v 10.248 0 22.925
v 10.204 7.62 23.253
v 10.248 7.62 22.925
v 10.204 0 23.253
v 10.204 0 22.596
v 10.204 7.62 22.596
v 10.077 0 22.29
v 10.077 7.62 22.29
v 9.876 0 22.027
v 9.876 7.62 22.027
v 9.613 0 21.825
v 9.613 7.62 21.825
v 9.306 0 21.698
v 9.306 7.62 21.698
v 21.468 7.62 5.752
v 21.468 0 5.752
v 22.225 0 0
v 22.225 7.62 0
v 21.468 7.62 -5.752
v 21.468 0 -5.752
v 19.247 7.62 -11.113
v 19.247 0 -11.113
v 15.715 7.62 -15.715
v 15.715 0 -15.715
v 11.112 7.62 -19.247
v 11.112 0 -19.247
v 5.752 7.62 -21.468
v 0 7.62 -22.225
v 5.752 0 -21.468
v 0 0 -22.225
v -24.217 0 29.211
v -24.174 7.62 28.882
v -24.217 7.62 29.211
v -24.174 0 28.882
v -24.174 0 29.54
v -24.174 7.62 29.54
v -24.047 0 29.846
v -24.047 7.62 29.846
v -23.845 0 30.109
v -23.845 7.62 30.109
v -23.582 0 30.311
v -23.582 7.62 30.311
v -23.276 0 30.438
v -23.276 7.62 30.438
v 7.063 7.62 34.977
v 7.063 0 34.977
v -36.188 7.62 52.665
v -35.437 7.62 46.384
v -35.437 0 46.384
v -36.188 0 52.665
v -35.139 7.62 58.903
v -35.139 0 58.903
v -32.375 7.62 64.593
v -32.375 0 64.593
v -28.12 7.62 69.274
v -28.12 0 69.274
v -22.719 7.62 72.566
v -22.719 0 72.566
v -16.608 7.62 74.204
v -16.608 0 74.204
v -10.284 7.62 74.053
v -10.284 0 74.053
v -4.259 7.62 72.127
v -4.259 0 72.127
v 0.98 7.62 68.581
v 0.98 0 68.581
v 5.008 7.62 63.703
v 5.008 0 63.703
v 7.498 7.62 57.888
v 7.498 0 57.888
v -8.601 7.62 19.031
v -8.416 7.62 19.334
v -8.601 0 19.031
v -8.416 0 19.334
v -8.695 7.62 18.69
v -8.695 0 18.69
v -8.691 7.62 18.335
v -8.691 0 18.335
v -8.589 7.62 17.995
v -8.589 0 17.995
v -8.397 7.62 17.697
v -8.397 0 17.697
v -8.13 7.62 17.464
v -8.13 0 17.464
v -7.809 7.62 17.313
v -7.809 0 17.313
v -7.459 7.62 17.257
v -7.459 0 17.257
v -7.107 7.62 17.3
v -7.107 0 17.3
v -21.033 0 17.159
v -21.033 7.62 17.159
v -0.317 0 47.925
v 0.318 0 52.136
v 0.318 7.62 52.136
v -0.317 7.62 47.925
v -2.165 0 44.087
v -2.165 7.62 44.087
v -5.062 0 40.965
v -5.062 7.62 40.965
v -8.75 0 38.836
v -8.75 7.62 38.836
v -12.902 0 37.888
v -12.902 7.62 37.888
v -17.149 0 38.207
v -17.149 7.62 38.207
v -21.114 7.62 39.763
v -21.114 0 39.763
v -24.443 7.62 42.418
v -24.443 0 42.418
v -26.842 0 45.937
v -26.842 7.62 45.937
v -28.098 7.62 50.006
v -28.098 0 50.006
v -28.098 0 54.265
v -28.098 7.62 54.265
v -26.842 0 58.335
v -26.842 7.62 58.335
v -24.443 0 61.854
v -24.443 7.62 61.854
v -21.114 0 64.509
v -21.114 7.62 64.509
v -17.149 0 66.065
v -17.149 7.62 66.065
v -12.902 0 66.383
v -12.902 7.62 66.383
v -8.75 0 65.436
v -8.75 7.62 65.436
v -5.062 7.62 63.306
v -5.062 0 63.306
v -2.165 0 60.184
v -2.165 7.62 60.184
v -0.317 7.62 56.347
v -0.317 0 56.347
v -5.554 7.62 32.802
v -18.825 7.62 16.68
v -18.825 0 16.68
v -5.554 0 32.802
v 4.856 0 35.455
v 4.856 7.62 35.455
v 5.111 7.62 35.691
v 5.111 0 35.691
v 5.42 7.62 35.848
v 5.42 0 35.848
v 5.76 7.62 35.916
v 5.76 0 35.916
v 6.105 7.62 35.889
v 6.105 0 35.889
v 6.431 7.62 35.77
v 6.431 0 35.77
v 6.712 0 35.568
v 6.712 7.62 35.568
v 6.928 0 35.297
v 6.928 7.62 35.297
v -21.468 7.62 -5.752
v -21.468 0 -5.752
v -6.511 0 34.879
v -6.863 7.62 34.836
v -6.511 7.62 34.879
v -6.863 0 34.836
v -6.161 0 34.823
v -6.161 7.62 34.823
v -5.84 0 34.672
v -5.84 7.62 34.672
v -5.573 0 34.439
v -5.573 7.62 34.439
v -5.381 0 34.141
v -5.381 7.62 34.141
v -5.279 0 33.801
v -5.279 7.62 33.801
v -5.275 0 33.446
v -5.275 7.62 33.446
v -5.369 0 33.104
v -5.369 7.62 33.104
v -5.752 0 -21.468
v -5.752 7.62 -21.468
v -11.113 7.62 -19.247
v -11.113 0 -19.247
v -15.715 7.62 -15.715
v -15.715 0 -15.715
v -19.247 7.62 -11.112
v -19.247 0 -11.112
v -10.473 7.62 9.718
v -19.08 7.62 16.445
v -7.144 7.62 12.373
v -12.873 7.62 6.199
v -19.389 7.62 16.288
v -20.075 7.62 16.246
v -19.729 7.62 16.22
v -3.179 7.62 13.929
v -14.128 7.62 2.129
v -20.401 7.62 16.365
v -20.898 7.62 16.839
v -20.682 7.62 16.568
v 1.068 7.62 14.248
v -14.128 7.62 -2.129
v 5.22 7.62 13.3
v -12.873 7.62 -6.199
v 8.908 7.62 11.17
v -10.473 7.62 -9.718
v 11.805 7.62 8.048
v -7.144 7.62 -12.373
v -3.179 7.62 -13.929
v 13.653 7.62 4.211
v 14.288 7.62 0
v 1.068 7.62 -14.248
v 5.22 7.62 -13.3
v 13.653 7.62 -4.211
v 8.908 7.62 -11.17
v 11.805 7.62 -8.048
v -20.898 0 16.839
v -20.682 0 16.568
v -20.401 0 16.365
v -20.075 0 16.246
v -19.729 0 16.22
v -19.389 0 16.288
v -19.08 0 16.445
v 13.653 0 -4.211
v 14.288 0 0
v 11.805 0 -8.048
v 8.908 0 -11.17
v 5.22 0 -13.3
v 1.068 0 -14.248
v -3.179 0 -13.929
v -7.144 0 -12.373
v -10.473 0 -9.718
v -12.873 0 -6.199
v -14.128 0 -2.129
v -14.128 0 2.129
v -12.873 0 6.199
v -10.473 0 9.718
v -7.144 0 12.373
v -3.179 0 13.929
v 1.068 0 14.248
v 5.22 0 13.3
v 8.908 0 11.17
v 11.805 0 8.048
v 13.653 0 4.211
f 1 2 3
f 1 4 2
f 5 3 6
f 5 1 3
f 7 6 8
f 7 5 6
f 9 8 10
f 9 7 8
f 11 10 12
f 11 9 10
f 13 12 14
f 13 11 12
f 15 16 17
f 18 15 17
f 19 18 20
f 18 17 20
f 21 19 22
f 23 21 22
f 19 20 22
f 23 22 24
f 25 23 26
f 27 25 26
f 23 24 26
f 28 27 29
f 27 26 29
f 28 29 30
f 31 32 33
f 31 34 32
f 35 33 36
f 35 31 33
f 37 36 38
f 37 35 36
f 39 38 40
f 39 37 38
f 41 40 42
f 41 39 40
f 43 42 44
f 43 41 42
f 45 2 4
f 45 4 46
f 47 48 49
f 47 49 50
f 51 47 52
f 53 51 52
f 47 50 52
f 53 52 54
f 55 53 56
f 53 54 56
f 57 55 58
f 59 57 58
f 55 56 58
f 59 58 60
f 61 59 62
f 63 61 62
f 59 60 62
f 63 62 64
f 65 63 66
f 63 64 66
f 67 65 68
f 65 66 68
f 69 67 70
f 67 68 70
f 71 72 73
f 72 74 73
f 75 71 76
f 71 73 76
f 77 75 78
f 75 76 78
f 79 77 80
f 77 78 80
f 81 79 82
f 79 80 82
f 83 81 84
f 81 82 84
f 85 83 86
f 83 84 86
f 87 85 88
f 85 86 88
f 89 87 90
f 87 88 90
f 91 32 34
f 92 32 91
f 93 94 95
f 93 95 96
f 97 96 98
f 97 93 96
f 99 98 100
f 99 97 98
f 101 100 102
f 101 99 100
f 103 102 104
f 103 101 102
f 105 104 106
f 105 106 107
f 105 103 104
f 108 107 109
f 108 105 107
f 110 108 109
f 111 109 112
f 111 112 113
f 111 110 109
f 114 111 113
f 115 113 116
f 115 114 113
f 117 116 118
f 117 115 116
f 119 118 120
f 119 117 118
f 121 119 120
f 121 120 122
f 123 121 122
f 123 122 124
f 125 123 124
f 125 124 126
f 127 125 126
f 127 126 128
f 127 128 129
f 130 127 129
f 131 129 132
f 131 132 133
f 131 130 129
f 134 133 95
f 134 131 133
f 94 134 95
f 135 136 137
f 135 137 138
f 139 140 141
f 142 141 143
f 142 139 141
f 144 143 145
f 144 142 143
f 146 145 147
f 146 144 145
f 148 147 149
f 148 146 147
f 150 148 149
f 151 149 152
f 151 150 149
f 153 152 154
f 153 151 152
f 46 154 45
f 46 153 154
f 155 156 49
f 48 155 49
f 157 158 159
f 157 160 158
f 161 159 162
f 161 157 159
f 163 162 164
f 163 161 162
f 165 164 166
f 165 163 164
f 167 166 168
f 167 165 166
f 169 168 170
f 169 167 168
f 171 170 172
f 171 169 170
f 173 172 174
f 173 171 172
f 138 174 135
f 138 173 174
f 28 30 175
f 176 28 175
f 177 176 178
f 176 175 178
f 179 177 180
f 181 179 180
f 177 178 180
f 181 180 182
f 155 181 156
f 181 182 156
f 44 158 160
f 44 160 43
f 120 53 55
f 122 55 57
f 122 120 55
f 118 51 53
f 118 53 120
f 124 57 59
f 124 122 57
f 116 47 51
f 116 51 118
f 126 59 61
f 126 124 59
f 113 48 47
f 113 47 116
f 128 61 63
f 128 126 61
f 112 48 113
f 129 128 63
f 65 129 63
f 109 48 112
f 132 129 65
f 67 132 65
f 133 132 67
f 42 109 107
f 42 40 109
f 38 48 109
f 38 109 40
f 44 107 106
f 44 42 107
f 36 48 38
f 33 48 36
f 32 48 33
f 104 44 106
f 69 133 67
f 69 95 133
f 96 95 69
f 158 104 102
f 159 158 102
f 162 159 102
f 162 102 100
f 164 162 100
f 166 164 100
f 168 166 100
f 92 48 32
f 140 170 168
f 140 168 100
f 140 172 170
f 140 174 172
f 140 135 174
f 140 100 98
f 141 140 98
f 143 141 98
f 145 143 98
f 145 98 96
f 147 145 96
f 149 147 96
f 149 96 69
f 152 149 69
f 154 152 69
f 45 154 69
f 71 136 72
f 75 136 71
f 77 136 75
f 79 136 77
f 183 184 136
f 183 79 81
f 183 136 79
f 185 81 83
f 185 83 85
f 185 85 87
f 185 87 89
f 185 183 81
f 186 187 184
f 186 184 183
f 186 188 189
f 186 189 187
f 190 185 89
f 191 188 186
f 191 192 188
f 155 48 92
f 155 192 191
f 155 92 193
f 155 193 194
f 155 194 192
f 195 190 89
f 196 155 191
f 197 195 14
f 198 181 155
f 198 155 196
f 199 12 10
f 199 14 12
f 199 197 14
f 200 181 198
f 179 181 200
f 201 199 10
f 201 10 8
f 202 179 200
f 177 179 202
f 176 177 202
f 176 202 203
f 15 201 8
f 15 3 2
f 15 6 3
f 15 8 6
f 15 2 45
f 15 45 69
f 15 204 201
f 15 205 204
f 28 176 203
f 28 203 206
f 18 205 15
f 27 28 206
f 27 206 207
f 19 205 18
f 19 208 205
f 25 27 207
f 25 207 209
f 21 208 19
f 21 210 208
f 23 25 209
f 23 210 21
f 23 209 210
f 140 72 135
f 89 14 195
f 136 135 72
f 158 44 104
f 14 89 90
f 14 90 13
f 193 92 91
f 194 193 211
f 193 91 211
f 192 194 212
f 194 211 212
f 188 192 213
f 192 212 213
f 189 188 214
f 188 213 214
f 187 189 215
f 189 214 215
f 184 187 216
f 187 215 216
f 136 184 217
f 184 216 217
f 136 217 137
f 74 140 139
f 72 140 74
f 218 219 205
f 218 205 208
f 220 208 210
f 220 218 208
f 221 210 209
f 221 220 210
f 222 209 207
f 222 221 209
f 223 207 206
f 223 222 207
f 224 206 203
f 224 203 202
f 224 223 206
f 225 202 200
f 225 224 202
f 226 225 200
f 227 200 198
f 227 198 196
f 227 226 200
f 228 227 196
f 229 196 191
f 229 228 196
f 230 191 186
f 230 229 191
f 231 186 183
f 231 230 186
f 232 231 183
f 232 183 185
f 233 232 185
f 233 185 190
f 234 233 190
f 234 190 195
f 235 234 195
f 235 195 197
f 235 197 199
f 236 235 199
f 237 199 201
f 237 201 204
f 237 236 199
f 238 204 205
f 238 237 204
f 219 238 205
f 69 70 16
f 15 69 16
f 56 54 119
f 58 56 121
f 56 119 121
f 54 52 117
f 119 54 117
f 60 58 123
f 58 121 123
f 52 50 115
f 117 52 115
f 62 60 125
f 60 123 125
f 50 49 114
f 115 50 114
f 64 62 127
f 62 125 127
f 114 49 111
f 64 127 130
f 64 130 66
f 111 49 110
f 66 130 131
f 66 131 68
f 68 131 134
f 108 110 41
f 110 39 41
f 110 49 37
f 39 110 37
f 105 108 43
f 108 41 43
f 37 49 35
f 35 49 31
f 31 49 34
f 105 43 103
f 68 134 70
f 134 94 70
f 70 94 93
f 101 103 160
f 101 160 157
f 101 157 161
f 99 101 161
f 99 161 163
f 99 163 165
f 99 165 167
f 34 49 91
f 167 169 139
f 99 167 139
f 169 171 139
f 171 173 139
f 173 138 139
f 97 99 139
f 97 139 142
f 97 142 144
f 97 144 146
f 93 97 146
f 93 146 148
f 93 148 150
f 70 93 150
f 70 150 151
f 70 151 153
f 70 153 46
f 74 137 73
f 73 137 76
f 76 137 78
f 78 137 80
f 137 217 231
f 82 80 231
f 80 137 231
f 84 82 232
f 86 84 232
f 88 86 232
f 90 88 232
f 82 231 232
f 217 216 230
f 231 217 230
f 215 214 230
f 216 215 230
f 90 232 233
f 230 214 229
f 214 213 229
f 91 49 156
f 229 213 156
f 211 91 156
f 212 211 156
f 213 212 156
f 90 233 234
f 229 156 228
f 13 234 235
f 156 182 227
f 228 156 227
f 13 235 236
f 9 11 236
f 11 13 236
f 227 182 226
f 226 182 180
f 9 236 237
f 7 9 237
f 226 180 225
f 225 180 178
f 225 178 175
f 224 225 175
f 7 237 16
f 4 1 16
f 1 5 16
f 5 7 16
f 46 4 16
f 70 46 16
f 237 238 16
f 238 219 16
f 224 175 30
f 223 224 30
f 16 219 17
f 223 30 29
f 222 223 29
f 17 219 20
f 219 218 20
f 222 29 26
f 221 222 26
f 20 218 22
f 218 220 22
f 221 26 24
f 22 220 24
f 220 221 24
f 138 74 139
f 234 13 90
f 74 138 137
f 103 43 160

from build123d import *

# Parameters (mm, degrees)
SKETCH1_R           = 14.2875
BOSS_EXTRUDE1_DEPTH = 7.62
CUT_EXTRUDE1_DEPTH  = 8.62
FILLET1_R           = 1.27


with BuildPart() as part:
    # Sketch1 → Boss-Extrude1 (new body)
    with BuildSketch(Plane(origin=(0, 0, 0), x_dir=(1, 0, 0), z_dir=(0, 1, 0))):
        with BuildLine():
            Line((7.49794353, -57.888099751), (21.467701489, -5.752253277))
            ThreePointArc((21.467701489, -5.752253277), (17.632277988, 13.52972276), (0, 22.225))
            ThreePointArc((0, 22.225), (-13.52972276, 17.632277988), (-21.467701489, 5.752253277))
            Line((-21.467701489, 5.752253277), (-35.437459449, -46.383593197))
            ThreePointArc((-35.437459449, -46.383593197), (-19.722011237, -73.603547963), (7.49794353, -57.888099751))
        make_face()
        with Locations((-13.969757959, -52.135846474)):
            Circle(SKETCH1_R, mode=Mode.SUBTRACT)
        Circle(SKETCH1_R, mode=Mode.SUBTRACT)
    extrude(amount=BOSS_EXTRUDE1_DEPTH)

    # Sketch2 → Cut-Extrude1 (cut, through all)
    with BuildSketch(Plane(origin=(0, 7.62, 0), x_dir=(1, 0, 0), z_dir=(0, 1, 0))):
        Polygon((-20.393980488, -14.77508138), (-3.03503134, -35.86140715), (-24.502732829, -30.109153872), align=None)
        Polygon((-10.93472662, -16.274439324), (10.532974869, -22.026692602), (6.424222528, -37.360765094), align=None)
    extrude(amount=-CUT_EXTRUDE1_DEPTH, mode=Mode.SUBTRACT)

    # Fillet1
    fillet1_edges = [part.edges().sort_by_distance(p)[0] for p in [
        (-24.502732829, 3.81, 30.109153872),
        (-20.393980488, 3.81, 14.77508138),
        (-3.03503134, 3.81, 35.86140715),
        (6.424222528, 3.81, 37.360765094),
        (-10.93472662, 3.81, 16.274439324),
        (10.532974869, 3.81, 22.026692602),
    ]]
    fillet(fillet1_edges, radius=FILLET1_R)


solid = part.part
